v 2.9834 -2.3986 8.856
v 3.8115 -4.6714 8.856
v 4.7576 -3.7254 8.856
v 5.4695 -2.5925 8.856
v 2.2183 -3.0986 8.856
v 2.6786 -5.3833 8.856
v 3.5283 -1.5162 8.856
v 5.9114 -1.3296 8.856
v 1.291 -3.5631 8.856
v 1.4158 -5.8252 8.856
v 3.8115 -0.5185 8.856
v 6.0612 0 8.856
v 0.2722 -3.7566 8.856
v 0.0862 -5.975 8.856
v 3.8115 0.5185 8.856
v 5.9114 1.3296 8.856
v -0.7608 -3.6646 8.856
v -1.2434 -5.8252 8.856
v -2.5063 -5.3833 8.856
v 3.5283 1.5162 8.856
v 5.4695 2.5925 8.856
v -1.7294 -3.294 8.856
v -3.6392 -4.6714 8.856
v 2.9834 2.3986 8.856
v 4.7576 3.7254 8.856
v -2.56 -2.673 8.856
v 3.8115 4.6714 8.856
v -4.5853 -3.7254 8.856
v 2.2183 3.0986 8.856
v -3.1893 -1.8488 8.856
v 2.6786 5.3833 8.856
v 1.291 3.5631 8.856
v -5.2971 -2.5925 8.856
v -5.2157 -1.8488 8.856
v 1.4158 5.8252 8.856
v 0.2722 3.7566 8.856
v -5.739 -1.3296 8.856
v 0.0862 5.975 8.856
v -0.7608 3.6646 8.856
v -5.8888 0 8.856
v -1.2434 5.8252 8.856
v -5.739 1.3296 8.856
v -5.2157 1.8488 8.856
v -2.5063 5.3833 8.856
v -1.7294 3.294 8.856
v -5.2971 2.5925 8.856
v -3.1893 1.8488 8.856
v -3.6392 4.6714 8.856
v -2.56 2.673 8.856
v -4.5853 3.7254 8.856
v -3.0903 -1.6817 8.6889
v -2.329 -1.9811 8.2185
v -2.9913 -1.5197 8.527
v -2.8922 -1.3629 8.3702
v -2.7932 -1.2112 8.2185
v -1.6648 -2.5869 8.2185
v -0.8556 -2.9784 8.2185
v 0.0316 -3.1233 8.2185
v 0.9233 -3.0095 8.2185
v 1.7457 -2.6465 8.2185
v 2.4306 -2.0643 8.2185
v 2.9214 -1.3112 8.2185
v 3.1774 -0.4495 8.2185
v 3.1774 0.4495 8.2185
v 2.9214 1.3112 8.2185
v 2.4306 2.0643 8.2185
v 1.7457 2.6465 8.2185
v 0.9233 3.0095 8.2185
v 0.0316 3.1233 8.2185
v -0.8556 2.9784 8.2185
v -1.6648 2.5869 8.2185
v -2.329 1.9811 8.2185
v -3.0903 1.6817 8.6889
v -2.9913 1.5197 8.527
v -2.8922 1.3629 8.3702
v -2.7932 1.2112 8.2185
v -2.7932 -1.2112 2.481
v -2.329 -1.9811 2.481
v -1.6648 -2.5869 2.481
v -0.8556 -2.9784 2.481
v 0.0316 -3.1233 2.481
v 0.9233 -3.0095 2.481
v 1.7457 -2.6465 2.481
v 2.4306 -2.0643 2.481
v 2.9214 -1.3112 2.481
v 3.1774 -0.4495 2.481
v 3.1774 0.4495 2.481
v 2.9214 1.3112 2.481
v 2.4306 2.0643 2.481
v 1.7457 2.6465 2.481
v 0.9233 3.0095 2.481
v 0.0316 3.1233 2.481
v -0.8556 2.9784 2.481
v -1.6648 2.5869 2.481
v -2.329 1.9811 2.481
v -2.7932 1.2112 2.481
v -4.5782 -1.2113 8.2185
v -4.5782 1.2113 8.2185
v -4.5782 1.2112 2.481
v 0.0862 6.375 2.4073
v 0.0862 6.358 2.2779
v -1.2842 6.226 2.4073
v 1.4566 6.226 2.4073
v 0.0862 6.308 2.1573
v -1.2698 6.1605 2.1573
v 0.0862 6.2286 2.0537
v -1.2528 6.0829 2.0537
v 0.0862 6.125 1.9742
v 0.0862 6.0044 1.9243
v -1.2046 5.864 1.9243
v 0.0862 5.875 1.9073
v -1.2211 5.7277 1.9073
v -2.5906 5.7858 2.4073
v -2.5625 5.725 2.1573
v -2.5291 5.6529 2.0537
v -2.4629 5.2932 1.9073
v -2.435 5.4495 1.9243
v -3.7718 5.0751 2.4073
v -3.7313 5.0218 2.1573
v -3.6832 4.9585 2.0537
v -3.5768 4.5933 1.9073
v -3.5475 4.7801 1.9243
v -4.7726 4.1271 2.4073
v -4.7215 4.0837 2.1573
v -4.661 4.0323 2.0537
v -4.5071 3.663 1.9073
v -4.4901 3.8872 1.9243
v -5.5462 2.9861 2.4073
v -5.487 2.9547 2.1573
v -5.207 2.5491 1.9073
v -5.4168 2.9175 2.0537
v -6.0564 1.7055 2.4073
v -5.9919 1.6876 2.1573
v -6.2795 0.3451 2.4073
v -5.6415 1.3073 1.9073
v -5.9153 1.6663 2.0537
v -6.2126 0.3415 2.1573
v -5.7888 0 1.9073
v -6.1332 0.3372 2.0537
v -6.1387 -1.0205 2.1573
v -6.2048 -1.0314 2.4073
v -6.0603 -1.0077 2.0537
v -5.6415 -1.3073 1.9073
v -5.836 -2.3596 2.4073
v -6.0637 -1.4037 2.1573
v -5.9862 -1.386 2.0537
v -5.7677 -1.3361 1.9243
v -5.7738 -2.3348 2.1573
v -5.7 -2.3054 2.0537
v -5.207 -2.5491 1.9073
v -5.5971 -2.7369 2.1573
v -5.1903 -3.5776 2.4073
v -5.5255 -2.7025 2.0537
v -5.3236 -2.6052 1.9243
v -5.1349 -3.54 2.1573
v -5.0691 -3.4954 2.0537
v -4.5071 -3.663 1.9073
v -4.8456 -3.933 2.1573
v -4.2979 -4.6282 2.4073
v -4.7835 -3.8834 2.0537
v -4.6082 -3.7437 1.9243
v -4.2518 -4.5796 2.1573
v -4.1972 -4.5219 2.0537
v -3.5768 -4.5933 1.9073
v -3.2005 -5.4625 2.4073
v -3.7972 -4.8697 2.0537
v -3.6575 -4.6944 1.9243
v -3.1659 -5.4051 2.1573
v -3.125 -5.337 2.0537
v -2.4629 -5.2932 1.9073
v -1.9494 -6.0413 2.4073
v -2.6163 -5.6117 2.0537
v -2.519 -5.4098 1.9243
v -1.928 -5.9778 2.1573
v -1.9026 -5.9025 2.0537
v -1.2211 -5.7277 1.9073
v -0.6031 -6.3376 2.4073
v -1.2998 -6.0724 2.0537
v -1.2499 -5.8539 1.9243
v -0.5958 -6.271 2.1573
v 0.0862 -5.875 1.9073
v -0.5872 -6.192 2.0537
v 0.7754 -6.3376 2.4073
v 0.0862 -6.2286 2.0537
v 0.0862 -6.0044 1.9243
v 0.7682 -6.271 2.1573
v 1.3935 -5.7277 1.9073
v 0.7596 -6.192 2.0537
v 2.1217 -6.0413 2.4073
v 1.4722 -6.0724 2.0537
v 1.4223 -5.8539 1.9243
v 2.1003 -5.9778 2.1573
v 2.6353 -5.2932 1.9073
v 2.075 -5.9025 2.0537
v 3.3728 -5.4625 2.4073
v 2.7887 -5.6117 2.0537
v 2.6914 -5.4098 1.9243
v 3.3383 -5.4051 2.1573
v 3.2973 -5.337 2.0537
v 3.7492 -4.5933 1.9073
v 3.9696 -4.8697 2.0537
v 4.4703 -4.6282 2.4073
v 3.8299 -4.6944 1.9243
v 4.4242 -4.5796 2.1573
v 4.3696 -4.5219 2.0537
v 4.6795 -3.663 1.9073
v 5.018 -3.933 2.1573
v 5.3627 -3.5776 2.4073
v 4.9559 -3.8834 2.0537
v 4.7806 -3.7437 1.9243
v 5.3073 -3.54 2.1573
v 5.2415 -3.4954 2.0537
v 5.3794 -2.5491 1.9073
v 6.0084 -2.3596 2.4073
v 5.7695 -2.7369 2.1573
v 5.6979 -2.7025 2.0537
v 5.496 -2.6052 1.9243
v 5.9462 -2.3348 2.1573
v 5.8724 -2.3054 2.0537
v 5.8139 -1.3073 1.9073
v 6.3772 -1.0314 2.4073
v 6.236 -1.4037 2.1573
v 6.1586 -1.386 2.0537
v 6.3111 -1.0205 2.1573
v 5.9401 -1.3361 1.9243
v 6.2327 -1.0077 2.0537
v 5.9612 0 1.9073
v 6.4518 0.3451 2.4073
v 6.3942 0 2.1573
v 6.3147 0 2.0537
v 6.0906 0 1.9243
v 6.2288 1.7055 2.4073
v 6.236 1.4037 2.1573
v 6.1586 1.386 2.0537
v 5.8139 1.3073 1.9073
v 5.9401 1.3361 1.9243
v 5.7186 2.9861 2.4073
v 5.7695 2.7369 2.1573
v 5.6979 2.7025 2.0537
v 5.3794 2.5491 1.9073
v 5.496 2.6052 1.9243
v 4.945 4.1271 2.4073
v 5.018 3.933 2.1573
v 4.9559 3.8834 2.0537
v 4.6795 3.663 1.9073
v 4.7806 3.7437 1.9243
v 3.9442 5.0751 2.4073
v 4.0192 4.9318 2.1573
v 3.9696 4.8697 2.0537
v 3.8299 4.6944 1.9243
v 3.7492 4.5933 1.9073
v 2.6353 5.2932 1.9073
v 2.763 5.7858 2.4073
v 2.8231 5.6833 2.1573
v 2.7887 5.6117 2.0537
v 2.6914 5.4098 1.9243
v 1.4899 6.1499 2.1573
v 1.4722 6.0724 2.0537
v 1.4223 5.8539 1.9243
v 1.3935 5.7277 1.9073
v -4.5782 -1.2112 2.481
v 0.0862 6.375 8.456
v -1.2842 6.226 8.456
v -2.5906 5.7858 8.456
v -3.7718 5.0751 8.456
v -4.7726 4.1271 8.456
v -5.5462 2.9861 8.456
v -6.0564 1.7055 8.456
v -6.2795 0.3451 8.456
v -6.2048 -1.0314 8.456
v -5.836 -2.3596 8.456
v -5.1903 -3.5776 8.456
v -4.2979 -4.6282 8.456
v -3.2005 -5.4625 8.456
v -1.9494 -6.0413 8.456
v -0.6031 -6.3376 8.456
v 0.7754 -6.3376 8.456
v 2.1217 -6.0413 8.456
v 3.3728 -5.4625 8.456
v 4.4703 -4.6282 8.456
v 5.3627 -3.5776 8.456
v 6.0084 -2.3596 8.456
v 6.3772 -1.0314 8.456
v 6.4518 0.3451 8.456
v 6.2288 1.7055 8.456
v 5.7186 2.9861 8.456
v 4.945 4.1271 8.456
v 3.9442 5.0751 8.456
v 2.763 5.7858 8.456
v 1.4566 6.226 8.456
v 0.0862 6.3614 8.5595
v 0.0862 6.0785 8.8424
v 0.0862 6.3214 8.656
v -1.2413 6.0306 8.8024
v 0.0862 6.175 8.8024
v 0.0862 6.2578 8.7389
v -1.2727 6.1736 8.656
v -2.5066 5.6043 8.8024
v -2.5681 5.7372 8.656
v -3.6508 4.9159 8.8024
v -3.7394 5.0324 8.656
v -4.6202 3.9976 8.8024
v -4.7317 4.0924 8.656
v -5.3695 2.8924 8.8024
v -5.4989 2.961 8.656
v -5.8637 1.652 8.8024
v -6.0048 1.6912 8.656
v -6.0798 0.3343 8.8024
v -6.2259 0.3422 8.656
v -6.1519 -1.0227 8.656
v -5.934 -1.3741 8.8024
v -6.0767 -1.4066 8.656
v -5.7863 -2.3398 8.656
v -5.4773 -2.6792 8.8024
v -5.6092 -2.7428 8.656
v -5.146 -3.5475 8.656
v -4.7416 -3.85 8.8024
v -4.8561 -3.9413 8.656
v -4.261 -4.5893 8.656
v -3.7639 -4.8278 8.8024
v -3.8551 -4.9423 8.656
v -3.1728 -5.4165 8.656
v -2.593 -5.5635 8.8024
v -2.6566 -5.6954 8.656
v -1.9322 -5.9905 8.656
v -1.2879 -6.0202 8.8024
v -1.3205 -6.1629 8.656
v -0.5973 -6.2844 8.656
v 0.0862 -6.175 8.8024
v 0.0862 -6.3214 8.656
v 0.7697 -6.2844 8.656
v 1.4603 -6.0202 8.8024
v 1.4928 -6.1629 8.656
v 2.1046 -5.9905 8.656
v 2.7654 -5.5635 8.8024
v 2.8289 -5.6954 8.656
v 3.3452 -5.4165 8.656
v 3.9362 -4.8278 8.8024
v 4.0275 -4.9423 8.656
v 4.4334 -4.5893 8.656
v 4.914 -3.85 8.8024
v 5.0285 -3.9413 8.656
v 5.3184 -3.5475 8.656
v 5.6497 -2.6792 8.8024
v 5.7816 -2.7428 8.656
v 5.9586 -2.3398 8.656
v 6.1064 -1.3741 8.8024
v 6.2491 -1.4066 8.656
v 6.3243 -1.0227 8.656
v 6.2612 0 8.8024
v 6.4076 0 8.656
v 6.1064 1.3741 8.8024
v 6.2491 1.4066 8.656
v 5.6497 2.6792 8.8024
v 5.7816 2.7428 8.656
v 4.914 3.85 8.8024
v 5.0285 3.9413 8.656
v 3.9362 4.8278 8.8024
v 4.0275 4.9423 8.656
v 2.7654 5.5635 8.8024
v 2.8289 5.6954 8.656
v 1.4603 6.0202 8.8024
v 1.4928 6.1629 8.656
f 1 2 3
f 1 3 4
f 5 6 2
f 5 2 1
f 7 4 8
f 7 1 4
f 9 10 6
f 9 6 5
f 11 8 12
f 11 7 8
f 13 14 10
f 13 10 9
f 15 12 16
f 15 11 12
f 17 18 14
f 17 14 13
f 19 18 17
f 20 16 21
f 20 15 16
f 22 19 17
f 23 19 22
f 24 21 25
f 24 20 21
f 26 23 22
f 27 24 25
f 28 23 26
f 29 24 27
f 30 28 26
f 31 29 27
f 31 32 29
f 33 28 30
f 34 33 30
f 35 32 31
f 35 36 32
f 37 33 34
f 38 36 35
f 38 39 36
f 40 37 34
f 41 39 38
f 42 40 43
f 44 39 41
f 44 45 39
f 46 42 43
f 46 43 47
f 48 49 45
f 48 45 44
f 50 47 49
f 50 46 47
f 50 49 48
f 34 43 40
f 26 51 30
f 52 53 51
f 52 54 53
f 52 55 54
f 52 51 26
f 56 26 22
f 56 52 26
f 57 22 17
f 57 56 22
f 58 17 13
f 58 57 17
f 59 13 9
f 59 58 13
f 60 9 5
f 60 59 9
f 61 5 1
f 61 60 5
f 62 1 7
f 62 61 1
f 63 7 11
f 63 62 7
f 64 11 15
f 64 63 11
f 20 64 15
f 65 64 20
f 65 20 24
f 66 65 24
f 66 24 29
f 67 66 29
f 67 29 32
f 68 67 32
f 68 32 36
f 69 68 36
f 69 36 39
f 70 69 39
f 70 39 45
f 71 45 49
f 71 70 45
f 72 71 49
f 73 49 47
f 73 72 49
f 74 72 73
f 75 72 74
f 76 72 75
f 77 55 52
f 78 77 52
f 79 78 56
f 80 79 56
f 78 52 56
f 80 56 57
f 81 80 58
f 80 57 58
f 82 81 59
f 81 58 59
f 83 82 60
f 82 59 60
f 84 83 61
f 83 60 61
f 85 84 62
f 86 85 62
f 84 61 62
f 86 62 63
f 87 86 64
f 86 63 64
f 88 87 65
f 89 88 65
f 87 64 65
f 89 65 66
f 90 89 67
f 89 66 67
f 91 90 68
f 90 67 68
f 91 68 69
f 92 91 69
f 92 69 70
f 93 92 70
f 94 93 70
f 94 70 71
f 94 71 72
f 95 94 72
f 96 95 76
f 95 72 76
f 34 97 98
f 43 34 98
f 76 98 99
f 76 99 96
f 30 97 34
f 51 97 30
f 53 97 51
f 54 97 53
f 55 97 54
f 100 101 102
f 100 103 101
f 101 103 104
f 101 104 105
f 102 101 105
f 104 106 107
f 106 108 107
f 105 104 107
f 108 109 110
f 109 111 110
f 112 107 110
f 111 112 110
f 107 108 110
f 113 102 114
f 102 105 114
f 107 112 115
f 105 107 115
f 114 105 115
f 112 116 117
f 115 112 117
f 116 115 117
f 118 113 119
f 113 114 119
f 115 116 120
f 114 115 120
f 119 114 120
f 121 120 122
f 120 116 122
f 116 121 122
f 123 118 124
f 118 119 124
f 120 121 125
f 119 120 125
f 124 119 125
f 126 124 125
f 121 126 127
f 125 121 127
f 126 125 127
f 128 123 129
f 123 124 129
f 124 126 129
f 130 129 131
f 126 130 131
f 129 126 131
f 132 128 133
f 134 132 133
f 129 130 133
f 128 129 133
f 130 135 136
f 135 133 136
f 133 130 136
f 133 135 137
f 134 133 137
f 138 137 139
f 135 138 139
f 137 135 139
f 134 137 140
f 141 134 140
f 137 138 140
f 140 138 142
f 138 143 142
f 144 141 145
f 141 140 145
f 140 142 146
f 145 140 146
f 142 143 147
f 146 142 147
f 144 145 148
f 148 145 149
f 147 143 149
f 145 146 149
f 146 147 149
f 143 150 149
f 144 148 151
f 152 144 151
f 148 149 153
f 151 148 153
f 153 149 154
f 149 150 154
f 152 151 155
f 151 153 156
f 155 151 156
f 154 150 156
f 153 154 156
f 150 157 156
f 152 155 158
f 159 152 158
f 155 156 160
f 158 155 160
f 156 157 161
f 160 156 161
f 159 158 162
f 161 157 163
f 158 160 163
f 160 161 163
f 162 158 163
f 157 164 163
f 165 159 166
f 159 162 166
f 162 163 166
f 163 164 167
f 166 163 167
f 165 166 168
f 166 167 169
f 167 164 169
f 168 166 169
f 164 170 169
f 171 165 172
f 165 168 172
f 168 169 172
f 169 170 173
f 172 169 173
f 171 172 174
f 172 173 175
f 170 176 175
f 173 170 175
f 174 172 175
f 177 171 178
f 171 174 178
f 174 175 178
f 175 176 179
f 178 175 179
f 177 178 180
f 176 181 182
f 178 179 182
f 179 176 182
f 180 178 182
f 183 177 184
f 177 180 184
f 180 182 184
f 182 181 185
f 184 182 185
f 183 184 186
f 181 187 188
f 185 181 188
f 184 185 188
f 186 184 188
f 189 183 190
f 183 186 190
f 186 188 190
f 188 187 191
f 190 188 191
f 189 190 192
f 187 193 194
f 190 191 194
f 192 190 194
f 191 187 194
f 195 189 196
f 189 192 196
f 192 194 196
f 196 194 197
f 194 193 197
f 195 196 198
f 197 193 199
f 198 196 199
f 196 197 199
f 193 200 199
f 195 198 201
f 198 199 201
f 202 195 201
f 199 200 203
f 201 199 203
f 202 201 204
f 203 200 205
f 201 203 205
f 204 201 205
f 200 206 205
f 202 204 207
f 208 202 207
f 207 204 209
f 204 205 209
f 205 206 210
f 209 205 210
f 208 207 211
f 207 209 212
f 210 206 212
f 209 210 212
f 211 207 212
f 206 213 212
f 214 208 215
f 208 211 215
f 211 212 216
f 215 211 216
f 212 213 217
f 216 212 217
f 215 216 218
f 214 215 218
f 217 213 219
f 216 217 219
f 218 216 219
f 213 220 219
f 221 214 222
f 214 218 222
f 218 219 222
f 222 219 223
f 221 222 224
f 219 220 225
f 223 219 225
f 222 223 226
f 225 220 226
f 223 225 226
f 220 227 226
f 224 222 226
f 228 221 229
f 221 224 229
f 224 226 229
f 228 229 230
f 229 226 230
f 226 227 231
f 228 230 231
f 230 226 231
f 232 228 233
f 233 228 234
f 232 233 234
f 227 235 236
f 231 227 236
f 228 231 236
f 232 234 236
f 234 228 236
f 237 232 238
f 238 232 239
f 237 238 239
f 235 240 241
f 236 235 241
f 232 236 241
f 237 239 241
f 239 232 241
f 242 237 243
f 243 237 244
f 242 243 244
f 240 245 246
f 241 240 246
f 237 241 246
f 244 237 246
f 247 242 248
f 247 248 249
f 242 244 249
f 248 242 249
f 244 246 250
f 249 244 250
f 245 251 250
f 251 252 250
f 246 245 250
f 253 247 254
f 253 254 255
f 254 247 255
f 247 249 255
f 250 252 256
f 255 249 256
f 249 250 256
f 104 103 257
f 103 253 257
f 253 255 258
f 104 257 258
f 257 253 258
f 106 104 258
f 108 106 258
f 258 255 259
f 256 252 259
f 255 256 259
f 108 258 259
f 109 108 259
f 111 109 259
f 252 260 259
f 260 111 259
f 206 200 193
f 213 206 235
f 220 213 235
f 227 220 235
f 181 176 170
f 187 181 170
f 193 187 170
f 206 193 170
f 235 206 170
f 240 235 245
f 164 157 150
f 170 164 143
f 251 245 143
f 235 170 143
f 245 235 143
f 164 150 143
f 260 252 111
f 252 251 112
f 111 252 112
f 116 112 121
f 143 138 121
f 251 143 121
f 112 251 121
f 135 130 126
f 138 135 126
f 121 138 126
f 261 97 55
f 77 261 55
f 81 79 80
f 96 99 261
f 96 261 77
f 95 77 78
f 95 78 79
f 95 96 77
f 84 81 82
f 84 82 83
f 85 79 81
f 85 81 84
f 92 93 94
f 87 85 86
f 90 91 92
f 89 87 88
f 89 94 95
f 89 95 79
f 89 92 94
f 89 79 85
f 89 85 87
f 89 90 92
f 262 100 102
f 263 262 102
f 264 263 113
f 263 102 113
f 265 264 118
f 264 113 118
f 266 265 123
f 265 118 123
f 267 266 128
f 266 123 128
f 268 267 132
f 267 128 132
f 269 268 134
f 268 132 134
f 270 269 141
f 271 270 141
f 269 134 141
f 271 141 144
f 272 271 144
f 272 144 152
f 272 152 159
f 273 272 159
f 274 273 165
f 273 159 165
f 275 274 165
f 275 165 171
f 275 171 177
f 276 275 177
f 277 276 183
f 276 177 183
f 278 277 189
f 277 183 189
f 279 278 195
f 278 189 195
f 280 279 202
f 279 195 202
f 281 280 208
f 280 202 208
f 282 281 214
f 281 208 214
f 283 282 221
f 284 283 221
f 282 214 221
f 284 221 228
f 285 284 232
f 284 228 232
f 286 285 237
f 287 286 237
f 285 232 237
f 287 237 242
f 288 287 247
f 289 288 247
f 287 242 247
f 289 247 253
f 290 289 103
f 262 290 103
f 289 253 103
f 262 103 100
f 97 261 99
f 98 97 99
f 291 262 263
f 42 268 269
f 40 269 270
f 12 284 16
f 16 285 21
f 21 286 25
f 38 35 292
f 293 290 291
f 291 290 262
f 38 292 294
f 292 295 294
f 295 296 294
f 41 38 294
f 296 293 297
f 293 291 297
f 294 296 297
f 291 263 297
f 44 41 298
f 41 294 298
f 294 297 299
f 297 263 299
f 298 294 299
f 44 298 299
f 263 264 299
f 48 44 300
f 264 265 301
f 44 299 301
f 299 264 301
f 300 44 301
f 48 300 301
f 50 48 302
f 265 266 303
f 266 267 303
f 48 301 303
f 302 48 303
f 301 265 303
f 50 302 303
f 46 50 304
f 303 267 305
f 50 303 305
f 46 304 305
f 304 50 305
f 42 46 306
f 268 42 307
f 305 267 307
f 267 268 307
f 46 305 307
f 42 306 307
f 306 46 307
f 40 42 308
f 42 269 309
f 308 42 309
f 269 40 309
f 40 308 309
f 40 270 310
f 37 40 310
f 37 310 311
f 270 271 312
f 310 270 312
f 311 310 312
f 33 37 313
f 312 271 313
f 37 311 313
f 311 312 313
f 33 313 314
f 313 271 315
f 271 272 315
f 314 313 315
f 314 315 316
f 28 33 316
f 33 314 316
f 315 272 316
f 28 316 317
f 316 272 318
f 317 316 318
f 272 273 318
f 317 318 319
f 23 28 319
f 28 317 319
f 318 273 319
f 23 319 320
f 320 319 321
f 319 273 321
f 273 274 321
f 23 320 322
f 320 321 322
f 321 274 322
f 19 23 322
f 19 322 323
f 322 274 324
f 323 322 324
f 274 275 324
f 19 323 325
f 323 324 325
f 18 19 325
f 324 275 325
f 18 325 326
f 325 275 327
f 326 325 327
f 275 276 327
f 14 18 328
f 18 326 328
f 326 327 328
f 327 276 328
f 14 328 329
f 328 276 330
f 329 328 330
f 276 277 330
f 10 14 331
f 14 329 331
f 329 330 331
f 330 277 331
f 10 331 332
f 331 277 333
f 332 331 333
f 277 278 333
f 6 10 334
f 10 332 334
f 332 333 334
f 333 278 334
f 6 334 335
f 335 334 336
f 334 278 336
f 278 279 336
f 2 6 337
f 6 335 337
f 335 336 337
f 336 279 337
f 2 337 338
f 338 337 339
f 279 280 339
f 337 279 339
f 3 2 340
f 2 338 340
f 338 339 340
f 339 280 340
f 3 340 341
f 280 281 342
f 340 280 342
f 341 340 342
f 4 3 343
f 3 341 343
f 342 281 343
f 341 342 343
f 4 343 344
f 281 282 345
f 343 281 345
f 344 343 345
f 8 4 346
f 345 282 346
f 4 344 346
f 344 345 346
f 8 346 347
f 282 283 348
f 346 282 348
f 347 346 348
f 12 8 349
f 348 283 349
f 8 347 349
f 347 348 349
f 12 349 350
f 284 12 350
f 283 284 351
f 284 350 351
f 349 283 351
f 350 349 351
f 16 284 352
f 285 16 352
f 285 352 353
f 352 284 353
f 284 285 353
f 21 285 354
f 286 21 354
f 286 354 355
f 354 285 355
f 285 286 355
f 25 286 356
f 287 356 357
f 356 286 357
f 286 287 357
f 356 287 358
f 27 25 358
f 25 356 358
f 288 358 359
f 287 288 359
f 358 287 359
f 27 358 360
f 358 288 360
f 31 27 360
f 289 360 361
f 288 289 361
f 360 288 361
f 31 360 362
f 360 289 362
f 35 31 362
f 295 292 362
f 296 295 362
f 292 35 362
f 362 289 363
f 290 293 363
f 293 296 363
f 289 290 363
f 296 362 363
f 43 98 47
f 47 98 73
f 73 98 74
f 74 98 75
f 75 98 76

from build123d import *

# Parameters (mm, degrees)
SKETCH1_R               = 10
BOSS_EXTRUDE1_DEPTH     = 10.9
CUT_EXTRUDE1_DEPTH      = 10
CUT_EXTRUDE1_DEPTH_BACK = 10
CHAMFER1_SIZE           = 1
SCALE1_SCALE            = 0.75
SCALE2_SCALE            = 0.85
FILLET1_R               = 0.4
FILLET2_R               = 0.5


with BuildPart() as part:
    # Sketch1 → Boss-Extrude1 (new body)
    with BuildSketch(Plane(origin=(0, 0, 0), x_dir=(0, 1, 0), z_dir=(0, 0, 1))):
        Circle(SKETCH1_R)
    extrude(amount=BOSS_EXTRUDE1_DEPTH)

    # Sketch2 → Cut-Extrude1 (cut, two sides: drawn at the far end of the back side and taken through both)
    with BuildSketch(Plane.XY.offset(10.9).offset(-CUT_EXTRUDE1_DEPTH_BACK)):
        with BuildLine():
            Line((-4.516635916, 1.9), (-7.316635916, 1.9))
            Line((-7.316635916, 1.9), (-7.316635916, -1.9))
            Line((-7.316635916, -1.9), (-4.516635916, -1.9))
            ThreePointArc((-4.516635916, -1.9), (4.9, 0), (-4.516635916, 1.9))
        make_face()
    extrude(amount=CUT_EXTRUDE1_DEPTH + CUT_EXTRUDE1_DEPTH_BACK, mode=Mode.SUBTRACT)

    # Chamfer1
    chamfer1_edges = [part.edges().sort_by_distance(p)[0] for p in [
        (-5.916635916, -1.9, 10.9),
        (-7.316635916, 0, 10.9),
        (-5.916635916, 1.9, 10.9),
        (4.9, 0, 10.9),
    ]]
    chamfer(chamfer1_edges, length=CHAMFER1_SIZE)


with BuildPart() as part_1:
    # Scale1: scaled about (0.237766223, 0, 5.261412395)
    add(part.part.scale(SCALE1_SCALE).moved(Location((0.059441556, 0, 1.315353099))))


with BuildPart() as part_2:
    # Scale2: scaled about (0.237766223, 0, 5.261412395)
    add(part_1.part.scale(SCALE2_SCALE).moved(Location((0.035664933, 0, 0.789211859))))

    # Fillet1
    fillet1_edges = [part_2.edges().sort_by_distance(p)[0] for p in [
        (0.086190256, -6.375, 8.856011993),
    ]]
    fillet(fillet1_edges, radius=FILLET1_R)

    # Fillet2
    fillet2_edges = [part_2.edges().sort_by_distance(p)[0] for p in [
        (0.086190256, -6.375, 1.907261993),
    ]]
    fillet(fillet2_edges, radius=FILLET2_R)


solid = part_2.part
